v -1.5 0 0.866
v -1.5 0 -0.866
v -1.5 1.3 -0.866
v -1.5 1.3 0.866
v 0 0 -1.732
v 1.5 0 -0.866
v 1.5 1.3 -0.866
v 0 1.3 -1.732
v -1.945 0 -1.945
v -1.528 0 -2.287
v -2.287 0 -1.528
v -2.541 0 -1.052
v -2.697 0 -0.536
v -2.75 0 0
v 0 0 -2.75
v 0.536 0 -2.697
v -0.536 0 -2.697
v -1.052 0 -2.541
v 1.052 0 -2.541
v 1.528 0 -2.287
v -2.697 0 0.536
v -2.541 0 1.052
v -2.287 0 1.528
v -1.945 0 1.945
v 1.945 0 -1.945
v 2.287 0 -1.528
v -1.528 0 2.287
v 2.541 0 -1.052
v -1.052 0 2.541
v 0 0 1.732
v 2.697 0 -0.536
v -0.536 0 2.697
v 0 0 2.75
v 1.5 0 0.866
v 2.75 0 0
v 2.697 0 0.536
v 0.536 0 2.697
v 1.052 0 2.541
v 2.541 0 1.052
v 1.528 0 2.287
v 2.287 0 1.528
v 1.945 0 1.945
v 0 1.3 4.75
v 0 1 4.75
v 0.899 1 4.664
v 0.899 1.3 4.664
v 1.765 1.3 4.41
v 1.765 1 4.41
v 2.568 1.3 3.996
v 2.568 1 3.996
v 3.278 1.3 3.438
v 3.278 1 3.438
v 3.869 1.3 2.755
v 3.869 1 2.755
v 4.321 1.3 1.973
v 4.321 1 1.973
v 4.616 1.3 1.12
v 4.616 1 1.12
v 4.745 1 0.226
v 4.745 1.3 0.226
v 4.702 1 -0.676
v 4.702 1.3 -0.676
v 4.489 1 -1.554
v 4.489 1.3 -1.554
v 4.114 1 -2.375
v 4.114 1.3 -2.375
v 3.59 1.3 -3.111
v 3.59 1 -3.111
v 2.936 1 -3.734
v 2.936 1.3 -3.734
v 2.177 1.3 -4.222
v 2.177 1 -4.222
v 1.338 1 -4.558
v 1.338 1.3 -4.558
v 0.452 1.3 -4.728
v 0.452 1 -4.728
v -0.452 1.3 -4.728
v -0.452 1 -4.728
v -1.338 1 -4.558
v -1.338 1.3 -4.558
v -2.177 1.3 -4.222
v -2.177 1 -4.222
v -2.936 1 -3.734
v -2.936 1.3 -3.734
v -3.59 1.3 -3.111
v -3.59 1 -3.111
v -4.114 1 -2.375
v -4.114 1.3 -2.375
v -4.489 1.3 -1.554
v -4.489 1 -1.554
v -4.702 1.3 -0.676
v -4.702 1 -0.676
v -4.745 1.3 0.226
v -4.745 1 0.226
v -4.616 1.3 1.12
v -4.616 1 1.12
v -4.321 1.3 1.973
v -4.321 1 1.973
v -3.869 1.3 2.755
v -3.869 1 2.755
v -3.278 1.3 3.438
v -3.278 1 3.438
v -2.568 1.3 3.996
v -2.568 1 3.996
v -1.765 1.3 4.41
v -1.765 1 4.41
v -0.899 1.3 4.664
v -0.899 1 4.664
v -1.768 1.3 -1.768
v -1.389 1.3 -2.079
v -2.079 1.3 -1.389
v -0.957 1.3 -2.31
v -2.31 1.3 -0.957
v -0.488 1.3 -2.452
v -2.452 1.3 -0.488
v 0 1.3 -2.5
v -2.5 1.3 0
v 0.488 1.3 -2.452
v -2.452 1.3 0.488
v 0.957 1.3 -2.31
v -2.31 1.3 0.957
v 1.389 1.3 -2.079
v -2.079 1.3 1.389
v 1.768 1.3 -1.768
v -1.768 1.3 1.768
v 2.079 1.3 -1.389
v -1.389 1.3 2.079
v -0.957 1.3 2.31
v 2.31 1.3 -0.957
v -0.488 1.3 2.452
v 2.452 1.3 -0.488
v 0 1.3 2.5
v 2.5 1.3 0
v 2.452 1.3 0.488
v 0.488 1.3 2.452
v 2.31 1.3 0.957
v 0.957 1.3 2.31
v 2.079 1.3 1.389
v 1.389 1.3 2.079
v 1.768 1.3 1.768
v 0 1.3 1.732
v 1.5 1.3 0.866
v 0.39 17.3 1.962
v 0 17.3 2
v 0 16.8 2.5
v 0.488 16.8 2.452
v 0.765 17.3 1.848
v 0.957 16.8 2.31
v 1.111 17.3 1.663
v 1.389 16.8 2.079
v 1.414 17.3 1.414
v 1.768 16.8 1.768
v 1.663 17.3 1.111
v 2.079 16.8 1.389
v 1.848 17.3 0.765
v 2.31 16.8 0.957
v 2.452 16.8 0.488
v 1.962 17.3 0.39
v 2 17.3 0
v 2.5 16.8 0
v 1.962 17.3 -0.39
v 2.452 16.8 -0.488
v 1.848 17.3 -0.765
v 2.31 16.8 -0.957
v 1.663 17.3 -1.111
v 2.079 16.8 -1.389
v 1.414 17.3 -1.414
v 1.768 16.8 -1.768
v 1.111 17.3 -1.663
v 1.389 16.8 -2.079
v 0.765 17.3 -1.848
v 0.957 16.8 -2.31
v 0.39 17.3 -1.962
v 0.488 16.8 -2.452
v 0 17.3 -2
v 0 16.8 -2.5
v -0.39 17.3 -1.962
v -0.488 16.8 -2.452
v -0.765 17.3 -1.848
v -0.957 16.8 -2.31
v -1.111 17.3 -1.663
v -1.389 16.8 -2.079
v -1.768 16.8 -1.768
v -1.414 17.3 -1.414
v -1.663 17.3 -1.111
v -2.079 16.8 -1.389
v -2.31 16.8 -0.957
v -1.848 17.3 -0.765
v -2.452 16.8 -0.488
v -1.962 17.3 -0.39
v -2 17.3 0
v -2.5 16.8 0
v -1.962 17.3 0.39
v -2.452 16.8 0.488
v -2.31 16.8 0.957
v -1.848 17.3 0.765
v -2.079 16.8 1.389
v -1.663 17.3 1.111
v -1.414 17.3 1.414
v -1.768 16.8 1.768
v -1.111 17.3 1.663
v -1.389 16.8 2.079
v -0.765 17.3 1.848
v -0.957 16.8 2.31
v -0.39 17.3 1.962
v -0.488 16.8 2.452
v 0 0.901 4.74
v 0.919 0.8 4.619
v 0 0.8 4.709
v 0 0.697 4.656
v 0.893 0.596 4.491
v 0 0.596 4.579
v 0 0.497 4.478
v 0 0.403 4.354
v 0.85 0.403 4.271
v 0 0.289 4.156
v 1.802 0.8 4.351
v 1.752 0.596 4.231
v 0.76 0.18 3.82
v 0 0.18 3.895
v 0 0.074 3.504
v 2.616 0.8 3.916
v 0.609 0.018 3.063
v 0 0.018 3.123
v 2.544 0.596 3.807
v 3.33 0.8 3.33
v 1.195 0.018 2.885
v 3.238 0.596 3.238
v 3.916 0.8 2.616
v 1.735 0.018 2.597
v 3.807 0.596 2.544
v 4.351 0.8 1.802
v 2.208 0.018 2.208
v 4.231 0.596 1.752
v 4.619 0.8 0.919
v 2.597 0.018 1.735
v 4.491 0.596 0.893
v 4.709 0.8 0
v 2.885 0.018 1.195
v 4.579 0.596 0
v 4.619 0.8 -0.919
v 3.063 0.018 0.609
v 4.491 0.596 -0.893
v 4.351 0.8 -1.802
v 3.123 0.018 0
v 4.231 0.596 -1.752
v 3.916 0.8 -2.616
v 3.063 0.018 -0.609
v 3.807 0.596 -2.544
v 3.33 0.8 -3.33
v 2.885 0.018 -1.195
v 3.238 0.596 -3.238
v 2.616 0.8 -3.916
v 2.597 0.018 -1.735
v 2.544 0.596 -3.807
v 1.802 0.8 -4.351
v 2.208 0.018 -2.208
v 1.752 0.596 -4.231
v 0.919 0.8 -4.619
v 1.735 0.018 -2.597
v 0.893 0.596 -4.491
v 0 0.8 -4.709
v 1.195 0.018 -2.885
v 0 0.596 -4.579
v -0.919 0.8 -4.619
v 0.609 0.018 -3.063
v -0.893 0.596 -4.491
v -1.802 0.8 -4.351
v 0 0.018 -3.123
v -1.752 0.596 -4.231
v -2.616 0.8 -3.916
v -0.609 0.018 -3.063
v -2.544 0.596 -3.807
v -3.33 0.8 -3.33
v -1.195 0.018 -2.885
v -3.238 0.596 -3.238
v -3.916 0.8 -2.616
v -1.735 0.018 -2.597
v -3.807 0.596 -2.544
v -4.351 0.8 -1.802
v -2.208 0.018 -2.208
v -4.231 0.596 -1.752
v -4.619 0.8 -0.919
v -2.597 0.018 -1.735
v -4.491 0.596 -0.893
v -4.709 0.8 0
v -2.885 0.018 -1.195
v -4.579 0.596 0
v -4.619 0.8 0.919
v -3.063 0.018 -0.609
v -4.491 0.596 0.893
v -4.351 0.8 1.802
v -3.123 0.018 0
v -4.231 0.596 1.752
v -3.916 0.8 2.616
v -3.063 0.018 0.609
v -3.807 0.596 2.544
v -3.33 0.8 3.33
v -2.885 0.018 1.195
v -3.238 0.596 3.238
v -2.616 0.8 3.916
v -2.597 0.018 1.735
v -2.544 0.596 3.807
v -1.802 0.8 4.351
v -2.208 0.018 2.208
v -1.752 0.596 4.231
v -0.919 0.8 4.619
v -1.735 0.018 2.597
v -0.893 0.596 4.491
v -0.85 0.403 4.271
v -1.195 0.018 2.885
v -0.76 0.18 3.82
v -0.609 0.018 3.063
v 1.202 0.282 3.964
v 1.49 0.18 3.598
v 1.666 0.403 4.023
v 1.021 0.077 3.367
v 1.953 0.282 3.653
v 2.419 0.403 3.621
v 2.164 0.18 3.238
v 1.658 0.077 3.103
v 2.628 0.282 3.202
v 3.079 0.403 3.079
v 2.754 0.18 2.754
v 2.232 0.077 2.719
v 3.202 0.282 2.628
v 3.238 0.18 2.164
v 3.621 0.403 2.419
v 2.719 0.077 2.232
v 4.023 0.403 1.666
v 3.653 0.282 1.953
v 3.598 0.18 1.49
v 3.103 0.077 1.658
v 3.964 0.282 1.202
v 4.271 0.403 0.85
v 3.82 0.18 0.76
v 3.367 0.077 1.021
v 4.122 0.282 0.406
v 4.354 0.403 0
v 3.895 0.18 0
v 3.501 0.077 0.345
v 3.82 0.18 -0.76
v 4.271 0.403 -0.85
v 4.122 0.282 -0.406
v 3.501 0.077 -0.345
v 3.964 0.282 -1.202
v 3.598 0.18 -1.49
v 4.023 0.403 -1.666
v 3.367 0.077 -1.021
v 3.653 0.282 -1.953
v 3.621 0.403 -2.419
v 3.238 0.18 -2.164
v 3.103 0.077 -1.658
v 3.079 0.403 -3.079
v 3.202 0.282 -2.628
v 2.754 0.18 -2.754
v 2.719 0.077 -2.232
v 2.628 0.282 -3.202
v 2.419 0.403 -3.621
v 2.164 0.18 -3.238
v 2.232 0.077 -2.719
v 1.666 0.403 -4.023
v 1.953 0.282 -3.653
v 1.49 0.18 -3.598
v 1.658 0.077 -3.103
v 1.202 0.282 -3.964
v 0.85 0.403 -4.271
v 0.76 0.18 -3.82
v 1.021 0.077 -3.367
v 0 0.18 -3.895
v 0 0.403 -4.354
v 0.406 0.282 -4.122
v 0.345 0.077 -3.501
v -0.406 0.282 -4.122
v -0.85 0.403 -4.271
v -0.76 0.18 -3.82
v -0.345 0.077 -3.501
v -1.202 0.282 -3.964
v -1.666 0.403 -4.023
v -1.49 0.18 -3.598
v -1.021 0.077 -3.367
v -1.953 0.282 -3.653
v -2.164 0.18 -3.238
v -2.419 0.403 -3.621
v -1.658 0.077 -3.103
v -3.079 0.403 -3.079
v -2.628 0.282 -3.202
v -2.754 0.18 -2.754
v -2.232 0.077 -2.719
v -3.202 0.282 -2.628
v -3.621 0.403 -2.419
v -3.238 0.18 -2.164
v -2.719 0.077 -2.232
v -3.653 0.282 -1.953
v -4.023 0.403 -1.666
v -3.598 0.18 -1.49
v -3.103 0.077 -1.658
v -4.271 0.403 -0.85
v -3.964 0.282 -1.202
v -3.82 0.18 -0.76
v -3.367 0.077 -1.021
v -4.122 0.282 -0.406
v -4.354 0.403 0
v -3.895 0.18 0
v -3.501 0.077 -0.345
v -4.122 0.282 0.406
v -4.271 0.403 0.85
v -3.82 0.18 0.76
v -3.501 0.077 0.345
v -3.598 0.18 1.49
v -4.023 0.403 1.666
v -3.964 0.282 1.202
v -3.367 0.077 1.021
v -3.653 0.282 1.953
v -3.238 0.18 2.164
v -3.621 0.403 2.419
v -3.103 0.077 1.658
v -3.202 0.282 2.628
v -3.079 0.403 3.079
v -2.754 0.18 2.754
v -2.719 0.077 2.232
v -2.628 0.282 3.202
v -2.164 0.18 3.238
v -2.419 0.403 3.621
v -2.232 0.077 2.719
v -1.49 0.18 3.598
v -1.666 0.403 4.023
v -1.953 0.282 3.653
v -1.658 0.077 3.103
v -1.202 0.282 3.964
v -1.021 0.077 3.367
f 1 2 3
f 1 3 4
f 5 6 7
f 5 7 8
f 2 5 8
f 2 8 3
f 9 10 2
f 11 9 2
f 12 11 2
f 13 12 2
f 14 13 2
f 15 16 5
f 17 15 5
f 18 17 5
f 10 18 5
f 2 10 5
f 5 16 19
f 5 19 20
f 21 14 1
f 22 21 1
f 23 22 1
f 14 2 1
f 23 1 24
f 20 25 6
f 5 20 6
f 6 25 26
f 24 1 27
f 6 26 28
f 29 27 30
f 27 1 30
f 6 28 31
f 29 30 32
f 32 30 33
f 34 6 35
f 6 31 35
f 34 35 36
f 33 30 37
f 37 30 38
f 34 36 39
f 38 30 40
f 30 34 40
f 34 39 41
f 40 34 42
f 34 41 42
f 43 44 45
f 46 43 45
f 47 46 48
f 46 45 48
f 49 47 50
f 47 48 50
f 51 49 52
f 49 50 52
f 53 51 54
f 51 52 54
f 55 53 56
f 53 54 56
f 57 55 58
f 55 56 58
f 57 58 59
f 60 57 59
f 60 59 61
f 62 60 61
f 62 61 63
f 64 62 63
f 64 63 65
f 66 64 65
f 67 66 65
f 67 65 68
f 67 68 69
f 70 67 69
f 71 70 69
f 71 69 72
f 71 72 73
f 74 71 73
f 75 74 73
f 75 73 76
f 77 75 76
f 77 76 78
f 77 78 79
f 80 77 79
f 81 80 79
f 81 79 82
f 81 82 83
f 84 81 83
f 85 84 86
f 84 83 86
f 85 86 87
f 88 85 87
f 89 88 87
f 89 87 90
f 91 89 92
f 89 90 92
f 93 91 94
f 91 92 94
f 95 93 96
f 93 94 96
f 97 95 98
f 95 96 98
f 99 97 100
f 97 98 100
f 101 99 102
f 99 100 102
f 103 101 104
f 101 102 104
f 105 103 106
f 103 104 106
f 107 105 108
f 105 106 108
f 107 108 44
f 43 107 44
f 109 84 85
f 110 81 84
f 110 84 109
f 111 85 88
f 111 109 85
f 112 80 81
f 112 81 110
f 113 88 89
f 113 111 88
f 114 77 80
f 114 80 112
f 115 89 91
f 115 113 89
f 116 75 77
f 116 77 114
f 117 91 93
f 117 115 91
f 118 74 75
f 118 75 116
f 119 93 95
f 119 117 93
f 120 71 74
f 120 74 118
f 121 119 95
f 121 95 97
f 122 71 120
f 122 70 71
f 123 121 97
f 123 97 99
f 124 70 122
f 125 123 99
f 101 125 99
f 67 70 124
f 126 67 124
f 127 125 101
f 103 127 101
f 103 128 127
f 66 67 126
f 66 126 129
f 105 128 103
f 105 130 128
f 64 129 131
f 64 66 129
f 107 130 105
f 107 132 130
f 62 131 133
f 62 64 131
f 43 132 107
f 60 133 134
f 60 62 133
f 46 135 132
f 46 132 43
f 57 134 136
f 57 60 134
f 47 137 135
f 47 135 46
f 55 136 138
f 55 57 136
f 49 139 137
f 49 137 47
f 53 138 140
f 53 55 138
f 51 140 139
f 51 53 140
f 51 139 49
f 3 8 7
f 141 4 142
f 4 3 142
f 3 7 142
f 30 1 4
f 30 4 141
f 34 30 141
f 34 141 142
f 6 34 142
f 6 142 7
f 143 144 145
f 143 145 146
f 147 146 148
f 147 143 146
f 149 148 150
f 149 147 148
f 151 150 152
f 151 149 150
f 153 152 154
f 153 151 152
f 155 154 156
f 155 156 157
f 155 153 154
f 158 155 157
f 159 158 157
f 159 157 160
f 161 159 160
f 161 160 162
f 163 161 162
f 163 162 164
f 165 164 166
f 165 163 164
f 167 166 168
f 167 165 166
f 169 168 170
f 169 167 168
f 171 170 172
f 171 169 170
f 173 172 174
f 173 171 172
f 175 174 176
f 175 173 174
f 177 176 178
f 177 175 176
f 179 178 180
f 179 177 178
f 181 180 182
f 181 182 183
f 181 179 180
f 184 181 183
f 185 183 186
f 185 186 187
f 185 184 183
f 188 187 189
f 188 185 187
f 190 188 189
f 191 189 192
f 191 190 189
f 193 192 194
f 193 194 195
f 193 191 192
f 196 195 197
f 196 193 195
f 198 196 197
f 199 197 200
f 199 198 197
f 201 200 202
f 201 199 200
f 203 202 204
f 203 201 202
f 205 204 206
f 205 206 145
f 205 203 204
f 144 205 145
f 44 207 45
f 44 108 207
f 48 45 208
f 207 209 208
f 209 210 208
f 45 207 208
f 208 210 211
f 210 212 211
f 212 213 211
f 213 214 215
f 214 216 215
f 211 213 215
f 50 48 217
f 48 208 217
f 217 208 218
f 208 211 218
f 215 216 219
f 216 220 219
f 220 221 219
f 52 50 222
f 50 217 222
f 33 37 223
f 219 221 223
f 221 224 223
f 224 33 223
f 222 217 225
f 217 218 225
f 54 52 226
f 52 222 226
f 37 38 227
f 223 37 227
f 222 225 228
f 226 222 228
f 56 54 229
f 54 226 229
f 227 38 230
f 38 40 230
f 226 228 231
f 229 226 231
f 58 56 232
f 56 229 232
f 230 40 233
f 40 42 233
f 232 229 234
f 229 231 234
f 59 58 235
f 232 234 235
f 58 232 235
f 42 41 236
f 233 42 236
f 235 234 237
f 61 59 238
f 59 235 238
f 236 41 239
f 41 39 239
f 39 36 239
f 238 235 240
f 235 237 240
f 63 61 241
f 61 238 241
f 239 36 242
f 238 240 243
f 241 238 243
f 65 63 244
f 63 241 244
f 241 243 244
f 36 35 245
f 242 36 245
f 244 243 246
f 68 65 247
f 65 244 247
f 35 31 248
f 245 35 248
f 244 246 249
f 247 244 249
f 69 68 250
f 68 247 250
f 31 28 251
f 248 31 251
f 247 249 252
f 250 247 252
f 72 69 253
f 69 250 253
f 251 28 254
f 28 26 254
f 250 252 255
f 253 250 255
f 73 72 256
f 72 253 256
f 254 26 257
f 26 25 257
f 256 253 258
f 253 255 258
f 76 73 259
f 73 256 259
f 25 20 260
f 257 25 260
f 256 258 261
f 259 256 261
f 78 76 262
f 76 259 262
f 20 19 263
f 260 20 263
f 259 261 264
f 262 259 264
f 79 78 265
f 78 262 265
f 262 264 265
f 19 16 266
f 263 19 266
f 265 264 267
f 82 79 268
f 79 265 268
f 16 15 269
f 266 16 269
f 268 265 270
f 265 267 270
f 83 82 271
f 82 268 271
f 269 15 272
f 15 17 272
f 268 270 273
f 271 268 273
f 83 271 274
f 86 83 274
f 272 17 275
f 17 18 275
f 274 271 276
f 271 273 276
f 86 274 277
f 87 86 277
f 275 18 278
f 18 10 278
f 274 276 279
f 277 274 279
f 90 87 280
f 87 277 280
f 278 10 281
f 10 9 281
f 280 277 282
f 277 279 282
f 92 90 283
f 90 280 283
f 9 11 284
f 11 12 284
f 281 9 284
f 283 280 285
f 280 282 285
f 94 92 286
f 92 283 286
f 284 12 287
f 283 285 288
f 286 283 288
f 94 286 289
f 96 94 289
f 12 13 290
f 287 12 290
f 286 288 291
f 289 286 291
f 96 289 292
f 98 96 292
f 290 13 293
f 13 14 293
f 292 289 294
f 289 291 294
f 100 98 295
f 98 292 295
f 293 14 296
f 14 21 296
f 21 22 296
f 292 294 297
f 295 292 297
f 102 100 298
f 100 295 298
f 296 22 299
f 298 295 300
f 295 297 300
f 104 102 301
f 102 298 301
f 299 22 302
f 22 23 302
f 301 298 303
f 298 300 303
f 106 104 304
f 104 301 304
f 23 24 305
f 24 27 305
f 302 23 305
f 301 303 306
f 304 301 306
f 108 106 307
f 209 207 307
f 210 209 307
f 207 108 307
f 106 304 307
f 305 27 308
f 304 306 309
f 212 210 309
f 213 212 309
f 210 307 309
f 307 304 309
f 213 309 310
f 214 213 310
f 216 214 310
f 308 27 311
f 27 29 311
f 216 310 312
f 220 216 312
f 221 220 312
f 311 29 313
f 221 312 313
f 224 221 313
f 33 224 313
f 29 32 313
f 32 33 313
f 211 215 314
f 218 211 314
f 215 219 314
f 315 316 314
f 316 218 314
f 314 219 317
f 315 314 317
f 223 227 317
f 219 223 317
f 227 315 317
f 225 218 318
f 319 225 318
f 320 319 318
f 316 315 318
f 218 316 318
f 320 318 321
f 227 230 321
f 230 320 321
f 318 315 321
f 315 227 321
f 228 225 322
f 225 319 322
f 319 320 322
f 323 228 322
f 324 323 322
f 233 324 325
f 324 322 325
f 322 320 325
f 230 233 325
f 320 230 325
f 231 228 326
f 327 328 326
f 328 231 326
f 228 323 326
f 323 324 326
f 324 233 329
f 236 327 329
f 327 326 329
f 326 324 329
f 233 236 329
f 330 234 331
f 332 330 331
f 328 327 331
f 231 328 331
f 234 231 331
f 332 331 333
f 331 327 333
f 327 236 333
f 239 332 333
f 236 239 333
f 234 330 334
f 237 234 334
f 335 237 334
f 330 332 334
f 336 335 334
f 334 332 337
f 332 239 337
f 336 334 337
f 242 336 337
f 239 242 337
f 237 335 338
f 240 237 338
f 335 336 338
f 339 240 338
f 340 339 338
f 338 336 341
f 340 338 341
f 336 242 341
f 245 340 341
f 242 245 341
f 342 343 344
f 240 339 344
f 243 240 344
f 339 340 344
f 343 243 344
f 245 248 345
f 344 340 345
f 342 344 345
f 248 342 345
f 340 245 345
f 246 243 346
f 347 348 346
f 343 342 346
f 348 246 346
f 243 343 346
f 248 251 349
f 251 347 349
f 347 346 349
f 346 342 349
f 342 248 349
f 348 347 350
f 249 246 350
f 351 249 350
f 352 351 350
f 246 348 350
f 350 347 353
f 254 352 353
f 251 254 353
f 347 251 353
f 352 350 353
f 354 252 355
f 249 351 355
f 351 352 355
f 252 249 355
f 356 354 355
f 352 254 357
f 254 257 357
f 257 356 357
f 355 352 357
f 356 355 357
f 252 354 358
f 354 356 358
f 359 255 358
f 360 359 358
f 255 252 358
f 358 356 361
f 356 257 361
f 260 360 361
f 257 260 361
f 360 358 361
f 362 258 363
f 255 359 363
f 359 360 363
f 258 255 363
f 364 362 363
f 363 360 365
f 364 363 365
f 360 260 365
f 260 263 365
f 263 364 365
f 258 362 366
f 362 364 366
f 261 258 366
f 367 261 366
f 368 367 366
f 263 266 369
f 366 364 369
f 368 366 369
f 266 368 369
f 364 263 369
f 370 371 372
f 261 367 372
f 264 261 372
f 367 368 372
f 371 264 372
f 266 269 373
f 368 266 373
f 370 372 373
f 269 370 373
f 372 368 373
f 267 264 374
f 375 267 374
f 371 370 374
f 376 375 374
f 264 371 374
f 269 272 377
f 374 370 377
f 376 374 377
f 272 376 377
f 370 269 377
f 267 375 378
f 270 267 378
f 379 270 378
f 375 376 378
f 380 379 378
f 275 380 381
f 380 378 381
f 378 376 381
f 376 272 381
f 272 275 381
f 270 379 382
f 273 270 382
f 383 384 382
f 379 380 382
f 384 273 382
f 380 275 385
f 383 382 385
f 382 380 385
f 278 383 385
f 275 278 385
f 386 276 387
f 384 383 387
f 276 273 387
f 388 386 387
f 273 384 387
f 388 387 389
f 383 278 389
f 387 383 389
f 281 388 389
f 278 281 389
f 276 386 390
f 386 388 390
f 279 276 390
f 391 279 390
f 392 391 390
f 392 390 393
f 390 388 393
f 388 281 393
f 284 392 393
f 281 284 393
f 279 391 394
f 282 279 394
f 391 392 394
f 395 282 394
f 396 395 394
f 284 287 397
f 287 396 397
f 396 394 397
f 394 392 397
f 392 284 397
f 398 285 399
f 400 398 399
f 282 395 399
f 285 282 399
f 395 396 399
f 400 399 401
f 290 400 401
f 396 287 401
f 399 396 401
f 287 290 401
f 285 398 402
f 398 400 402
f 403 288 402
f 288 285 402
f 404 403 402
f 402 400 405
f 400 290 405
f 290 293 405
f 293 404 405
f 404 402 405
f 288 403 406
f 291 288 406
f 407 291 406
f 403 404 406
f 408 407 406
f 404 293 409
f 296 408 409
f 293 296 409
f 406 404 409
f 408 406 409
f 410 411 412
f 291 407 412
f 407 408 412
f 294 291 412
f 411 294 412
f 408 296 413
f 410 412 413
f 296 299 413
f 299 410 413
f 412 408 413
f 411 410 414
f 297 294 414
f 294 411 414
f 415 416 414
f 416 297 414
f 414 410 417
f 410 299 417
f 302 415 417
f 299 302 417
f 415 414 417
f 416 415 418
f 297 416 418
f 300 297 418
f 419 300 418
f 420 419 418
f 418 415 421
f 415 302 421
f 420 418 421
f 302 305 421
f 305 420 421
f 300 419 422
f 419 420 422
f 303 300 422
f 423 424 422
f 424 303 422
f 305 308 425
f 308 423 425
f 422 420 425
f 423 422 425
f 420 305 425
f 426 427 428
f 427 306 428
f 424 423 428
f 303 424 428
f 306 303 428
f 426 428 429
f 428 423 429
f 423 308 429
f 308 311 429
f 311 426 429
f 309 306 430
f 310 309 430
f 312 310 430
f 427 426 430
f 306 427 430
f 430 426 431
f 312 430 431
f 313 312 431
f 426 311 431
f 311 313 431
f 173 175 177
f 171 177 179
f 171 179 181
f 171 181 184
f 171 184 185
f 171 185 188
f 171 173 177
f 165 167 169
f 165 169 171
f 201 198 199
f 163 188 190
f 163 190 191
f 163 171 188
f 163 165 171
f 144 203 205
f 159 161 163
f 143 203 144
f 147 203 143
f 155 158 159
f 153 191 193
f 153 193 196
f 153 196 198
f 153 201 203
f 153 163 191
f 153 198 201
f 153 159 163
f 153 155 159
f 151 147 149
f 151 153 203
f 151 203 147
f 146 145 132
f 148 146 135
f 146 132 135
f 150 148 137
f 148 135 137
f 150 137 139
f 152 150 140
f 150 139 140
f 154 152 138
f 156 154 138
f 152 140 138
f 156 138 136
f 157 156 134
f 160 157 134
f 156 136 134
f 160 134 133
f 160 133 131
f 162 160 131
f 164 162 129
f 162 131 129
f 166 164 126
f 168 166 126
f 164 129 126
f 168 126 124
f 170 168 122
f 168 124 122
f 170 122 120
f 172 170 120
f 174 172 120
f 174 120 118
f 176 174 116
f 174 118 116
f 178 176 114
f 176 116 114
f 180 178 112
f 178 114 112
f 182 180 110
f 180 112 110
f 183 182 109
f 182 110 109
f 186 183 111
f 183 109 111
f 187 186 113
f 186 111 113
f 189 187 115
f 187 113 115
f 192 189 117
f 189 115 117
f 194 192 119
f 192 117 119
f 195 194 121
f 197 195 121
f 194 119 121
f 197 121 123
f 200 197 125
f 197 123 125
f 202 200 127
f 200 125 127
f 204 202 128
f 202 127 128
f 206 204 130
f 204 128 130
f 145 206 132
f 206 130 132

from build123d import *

# Parameters (mm, degrees)
SKETCH_1_R      = 4.75
EXTRUDE_1_DEPTH = 1.3
SKETCH_2_R      = 2.5
EXTRUDE_2_DEPTH = 16
CHAMFER_1_SIZE  = 0.5
FILLET_1_SIZE   = 1
FILLET_1_SIZE_2 = 2


with BuildPart() as part:
    # 草图1 → 凸台-拉伸1 (new body)
    with BuildSketch(Plane(origin=(0, 0, 0), x_dir=(1, 0, 0), z_dir=(0, 1, 0))):
        with Locations(Location((0, 0, 0), (0, 0, 270))):
            Circle(SKETCH_1_R)
        Polygon((0, -1.732050808), (1.5, -0.866025404), (1.5, 0.866025404), (0, 1.732050808), (-1.5, 0.866025404), (-1.5, -0.866025404), align=None, mode=Mode.SUBTRACT)
    extrude(amount=EXTRUDE_1_DEPTH)

    # 草图2 → 凸台-拉伸2 (add)
    with BuildSketch(Plane(origin=(0, 1.3, 0), x_dir=(1, 0, 0), z_dir=(0, 1, 0))):
        with Locations(Location((0, 0, 0), (0, 0, 270))):
            Circle(SKETCH_2_R)
    extrude(amount=EXTRUDE_2_DEPTH)

    # 倒角1
    chamfer_1_edges = [part.edges().sort_by_distance(p)[0] for p in [
        (0, 17.3, -2.5),
    ]]
    chamfer(chamfer_1_edges, length=CHAMFER_1_SIZE)

    # 圆角1
    # an asymmetric fillet: 2, 1 mm, written as the material it takes off along each edge
    with BuildSketch(Plane(origin=(0, 0, 0), x_dir=(0, 0, 1), z_dir=(-1, 0, 0))) as fillet_1_piece_1:
        with BuildLine():
            Bezier((4.75, FILLET_1_SIZE), (4.75, 0), (4.75 - FILLET_1_SIZE_2, 0), weights=[1, 0.707106781, 1])
            Line((4.75 - FILLET_1_SIZE_2, 0), (4.75, 0))
            Line((4.75, 0), (4.75, FILLET_1_SIZE))
        make_face()
    revolve(axis=Axis((0, 0, 0), (0, 1, 0)), mode=Mode.SUBTRACT)


solid = part.part
